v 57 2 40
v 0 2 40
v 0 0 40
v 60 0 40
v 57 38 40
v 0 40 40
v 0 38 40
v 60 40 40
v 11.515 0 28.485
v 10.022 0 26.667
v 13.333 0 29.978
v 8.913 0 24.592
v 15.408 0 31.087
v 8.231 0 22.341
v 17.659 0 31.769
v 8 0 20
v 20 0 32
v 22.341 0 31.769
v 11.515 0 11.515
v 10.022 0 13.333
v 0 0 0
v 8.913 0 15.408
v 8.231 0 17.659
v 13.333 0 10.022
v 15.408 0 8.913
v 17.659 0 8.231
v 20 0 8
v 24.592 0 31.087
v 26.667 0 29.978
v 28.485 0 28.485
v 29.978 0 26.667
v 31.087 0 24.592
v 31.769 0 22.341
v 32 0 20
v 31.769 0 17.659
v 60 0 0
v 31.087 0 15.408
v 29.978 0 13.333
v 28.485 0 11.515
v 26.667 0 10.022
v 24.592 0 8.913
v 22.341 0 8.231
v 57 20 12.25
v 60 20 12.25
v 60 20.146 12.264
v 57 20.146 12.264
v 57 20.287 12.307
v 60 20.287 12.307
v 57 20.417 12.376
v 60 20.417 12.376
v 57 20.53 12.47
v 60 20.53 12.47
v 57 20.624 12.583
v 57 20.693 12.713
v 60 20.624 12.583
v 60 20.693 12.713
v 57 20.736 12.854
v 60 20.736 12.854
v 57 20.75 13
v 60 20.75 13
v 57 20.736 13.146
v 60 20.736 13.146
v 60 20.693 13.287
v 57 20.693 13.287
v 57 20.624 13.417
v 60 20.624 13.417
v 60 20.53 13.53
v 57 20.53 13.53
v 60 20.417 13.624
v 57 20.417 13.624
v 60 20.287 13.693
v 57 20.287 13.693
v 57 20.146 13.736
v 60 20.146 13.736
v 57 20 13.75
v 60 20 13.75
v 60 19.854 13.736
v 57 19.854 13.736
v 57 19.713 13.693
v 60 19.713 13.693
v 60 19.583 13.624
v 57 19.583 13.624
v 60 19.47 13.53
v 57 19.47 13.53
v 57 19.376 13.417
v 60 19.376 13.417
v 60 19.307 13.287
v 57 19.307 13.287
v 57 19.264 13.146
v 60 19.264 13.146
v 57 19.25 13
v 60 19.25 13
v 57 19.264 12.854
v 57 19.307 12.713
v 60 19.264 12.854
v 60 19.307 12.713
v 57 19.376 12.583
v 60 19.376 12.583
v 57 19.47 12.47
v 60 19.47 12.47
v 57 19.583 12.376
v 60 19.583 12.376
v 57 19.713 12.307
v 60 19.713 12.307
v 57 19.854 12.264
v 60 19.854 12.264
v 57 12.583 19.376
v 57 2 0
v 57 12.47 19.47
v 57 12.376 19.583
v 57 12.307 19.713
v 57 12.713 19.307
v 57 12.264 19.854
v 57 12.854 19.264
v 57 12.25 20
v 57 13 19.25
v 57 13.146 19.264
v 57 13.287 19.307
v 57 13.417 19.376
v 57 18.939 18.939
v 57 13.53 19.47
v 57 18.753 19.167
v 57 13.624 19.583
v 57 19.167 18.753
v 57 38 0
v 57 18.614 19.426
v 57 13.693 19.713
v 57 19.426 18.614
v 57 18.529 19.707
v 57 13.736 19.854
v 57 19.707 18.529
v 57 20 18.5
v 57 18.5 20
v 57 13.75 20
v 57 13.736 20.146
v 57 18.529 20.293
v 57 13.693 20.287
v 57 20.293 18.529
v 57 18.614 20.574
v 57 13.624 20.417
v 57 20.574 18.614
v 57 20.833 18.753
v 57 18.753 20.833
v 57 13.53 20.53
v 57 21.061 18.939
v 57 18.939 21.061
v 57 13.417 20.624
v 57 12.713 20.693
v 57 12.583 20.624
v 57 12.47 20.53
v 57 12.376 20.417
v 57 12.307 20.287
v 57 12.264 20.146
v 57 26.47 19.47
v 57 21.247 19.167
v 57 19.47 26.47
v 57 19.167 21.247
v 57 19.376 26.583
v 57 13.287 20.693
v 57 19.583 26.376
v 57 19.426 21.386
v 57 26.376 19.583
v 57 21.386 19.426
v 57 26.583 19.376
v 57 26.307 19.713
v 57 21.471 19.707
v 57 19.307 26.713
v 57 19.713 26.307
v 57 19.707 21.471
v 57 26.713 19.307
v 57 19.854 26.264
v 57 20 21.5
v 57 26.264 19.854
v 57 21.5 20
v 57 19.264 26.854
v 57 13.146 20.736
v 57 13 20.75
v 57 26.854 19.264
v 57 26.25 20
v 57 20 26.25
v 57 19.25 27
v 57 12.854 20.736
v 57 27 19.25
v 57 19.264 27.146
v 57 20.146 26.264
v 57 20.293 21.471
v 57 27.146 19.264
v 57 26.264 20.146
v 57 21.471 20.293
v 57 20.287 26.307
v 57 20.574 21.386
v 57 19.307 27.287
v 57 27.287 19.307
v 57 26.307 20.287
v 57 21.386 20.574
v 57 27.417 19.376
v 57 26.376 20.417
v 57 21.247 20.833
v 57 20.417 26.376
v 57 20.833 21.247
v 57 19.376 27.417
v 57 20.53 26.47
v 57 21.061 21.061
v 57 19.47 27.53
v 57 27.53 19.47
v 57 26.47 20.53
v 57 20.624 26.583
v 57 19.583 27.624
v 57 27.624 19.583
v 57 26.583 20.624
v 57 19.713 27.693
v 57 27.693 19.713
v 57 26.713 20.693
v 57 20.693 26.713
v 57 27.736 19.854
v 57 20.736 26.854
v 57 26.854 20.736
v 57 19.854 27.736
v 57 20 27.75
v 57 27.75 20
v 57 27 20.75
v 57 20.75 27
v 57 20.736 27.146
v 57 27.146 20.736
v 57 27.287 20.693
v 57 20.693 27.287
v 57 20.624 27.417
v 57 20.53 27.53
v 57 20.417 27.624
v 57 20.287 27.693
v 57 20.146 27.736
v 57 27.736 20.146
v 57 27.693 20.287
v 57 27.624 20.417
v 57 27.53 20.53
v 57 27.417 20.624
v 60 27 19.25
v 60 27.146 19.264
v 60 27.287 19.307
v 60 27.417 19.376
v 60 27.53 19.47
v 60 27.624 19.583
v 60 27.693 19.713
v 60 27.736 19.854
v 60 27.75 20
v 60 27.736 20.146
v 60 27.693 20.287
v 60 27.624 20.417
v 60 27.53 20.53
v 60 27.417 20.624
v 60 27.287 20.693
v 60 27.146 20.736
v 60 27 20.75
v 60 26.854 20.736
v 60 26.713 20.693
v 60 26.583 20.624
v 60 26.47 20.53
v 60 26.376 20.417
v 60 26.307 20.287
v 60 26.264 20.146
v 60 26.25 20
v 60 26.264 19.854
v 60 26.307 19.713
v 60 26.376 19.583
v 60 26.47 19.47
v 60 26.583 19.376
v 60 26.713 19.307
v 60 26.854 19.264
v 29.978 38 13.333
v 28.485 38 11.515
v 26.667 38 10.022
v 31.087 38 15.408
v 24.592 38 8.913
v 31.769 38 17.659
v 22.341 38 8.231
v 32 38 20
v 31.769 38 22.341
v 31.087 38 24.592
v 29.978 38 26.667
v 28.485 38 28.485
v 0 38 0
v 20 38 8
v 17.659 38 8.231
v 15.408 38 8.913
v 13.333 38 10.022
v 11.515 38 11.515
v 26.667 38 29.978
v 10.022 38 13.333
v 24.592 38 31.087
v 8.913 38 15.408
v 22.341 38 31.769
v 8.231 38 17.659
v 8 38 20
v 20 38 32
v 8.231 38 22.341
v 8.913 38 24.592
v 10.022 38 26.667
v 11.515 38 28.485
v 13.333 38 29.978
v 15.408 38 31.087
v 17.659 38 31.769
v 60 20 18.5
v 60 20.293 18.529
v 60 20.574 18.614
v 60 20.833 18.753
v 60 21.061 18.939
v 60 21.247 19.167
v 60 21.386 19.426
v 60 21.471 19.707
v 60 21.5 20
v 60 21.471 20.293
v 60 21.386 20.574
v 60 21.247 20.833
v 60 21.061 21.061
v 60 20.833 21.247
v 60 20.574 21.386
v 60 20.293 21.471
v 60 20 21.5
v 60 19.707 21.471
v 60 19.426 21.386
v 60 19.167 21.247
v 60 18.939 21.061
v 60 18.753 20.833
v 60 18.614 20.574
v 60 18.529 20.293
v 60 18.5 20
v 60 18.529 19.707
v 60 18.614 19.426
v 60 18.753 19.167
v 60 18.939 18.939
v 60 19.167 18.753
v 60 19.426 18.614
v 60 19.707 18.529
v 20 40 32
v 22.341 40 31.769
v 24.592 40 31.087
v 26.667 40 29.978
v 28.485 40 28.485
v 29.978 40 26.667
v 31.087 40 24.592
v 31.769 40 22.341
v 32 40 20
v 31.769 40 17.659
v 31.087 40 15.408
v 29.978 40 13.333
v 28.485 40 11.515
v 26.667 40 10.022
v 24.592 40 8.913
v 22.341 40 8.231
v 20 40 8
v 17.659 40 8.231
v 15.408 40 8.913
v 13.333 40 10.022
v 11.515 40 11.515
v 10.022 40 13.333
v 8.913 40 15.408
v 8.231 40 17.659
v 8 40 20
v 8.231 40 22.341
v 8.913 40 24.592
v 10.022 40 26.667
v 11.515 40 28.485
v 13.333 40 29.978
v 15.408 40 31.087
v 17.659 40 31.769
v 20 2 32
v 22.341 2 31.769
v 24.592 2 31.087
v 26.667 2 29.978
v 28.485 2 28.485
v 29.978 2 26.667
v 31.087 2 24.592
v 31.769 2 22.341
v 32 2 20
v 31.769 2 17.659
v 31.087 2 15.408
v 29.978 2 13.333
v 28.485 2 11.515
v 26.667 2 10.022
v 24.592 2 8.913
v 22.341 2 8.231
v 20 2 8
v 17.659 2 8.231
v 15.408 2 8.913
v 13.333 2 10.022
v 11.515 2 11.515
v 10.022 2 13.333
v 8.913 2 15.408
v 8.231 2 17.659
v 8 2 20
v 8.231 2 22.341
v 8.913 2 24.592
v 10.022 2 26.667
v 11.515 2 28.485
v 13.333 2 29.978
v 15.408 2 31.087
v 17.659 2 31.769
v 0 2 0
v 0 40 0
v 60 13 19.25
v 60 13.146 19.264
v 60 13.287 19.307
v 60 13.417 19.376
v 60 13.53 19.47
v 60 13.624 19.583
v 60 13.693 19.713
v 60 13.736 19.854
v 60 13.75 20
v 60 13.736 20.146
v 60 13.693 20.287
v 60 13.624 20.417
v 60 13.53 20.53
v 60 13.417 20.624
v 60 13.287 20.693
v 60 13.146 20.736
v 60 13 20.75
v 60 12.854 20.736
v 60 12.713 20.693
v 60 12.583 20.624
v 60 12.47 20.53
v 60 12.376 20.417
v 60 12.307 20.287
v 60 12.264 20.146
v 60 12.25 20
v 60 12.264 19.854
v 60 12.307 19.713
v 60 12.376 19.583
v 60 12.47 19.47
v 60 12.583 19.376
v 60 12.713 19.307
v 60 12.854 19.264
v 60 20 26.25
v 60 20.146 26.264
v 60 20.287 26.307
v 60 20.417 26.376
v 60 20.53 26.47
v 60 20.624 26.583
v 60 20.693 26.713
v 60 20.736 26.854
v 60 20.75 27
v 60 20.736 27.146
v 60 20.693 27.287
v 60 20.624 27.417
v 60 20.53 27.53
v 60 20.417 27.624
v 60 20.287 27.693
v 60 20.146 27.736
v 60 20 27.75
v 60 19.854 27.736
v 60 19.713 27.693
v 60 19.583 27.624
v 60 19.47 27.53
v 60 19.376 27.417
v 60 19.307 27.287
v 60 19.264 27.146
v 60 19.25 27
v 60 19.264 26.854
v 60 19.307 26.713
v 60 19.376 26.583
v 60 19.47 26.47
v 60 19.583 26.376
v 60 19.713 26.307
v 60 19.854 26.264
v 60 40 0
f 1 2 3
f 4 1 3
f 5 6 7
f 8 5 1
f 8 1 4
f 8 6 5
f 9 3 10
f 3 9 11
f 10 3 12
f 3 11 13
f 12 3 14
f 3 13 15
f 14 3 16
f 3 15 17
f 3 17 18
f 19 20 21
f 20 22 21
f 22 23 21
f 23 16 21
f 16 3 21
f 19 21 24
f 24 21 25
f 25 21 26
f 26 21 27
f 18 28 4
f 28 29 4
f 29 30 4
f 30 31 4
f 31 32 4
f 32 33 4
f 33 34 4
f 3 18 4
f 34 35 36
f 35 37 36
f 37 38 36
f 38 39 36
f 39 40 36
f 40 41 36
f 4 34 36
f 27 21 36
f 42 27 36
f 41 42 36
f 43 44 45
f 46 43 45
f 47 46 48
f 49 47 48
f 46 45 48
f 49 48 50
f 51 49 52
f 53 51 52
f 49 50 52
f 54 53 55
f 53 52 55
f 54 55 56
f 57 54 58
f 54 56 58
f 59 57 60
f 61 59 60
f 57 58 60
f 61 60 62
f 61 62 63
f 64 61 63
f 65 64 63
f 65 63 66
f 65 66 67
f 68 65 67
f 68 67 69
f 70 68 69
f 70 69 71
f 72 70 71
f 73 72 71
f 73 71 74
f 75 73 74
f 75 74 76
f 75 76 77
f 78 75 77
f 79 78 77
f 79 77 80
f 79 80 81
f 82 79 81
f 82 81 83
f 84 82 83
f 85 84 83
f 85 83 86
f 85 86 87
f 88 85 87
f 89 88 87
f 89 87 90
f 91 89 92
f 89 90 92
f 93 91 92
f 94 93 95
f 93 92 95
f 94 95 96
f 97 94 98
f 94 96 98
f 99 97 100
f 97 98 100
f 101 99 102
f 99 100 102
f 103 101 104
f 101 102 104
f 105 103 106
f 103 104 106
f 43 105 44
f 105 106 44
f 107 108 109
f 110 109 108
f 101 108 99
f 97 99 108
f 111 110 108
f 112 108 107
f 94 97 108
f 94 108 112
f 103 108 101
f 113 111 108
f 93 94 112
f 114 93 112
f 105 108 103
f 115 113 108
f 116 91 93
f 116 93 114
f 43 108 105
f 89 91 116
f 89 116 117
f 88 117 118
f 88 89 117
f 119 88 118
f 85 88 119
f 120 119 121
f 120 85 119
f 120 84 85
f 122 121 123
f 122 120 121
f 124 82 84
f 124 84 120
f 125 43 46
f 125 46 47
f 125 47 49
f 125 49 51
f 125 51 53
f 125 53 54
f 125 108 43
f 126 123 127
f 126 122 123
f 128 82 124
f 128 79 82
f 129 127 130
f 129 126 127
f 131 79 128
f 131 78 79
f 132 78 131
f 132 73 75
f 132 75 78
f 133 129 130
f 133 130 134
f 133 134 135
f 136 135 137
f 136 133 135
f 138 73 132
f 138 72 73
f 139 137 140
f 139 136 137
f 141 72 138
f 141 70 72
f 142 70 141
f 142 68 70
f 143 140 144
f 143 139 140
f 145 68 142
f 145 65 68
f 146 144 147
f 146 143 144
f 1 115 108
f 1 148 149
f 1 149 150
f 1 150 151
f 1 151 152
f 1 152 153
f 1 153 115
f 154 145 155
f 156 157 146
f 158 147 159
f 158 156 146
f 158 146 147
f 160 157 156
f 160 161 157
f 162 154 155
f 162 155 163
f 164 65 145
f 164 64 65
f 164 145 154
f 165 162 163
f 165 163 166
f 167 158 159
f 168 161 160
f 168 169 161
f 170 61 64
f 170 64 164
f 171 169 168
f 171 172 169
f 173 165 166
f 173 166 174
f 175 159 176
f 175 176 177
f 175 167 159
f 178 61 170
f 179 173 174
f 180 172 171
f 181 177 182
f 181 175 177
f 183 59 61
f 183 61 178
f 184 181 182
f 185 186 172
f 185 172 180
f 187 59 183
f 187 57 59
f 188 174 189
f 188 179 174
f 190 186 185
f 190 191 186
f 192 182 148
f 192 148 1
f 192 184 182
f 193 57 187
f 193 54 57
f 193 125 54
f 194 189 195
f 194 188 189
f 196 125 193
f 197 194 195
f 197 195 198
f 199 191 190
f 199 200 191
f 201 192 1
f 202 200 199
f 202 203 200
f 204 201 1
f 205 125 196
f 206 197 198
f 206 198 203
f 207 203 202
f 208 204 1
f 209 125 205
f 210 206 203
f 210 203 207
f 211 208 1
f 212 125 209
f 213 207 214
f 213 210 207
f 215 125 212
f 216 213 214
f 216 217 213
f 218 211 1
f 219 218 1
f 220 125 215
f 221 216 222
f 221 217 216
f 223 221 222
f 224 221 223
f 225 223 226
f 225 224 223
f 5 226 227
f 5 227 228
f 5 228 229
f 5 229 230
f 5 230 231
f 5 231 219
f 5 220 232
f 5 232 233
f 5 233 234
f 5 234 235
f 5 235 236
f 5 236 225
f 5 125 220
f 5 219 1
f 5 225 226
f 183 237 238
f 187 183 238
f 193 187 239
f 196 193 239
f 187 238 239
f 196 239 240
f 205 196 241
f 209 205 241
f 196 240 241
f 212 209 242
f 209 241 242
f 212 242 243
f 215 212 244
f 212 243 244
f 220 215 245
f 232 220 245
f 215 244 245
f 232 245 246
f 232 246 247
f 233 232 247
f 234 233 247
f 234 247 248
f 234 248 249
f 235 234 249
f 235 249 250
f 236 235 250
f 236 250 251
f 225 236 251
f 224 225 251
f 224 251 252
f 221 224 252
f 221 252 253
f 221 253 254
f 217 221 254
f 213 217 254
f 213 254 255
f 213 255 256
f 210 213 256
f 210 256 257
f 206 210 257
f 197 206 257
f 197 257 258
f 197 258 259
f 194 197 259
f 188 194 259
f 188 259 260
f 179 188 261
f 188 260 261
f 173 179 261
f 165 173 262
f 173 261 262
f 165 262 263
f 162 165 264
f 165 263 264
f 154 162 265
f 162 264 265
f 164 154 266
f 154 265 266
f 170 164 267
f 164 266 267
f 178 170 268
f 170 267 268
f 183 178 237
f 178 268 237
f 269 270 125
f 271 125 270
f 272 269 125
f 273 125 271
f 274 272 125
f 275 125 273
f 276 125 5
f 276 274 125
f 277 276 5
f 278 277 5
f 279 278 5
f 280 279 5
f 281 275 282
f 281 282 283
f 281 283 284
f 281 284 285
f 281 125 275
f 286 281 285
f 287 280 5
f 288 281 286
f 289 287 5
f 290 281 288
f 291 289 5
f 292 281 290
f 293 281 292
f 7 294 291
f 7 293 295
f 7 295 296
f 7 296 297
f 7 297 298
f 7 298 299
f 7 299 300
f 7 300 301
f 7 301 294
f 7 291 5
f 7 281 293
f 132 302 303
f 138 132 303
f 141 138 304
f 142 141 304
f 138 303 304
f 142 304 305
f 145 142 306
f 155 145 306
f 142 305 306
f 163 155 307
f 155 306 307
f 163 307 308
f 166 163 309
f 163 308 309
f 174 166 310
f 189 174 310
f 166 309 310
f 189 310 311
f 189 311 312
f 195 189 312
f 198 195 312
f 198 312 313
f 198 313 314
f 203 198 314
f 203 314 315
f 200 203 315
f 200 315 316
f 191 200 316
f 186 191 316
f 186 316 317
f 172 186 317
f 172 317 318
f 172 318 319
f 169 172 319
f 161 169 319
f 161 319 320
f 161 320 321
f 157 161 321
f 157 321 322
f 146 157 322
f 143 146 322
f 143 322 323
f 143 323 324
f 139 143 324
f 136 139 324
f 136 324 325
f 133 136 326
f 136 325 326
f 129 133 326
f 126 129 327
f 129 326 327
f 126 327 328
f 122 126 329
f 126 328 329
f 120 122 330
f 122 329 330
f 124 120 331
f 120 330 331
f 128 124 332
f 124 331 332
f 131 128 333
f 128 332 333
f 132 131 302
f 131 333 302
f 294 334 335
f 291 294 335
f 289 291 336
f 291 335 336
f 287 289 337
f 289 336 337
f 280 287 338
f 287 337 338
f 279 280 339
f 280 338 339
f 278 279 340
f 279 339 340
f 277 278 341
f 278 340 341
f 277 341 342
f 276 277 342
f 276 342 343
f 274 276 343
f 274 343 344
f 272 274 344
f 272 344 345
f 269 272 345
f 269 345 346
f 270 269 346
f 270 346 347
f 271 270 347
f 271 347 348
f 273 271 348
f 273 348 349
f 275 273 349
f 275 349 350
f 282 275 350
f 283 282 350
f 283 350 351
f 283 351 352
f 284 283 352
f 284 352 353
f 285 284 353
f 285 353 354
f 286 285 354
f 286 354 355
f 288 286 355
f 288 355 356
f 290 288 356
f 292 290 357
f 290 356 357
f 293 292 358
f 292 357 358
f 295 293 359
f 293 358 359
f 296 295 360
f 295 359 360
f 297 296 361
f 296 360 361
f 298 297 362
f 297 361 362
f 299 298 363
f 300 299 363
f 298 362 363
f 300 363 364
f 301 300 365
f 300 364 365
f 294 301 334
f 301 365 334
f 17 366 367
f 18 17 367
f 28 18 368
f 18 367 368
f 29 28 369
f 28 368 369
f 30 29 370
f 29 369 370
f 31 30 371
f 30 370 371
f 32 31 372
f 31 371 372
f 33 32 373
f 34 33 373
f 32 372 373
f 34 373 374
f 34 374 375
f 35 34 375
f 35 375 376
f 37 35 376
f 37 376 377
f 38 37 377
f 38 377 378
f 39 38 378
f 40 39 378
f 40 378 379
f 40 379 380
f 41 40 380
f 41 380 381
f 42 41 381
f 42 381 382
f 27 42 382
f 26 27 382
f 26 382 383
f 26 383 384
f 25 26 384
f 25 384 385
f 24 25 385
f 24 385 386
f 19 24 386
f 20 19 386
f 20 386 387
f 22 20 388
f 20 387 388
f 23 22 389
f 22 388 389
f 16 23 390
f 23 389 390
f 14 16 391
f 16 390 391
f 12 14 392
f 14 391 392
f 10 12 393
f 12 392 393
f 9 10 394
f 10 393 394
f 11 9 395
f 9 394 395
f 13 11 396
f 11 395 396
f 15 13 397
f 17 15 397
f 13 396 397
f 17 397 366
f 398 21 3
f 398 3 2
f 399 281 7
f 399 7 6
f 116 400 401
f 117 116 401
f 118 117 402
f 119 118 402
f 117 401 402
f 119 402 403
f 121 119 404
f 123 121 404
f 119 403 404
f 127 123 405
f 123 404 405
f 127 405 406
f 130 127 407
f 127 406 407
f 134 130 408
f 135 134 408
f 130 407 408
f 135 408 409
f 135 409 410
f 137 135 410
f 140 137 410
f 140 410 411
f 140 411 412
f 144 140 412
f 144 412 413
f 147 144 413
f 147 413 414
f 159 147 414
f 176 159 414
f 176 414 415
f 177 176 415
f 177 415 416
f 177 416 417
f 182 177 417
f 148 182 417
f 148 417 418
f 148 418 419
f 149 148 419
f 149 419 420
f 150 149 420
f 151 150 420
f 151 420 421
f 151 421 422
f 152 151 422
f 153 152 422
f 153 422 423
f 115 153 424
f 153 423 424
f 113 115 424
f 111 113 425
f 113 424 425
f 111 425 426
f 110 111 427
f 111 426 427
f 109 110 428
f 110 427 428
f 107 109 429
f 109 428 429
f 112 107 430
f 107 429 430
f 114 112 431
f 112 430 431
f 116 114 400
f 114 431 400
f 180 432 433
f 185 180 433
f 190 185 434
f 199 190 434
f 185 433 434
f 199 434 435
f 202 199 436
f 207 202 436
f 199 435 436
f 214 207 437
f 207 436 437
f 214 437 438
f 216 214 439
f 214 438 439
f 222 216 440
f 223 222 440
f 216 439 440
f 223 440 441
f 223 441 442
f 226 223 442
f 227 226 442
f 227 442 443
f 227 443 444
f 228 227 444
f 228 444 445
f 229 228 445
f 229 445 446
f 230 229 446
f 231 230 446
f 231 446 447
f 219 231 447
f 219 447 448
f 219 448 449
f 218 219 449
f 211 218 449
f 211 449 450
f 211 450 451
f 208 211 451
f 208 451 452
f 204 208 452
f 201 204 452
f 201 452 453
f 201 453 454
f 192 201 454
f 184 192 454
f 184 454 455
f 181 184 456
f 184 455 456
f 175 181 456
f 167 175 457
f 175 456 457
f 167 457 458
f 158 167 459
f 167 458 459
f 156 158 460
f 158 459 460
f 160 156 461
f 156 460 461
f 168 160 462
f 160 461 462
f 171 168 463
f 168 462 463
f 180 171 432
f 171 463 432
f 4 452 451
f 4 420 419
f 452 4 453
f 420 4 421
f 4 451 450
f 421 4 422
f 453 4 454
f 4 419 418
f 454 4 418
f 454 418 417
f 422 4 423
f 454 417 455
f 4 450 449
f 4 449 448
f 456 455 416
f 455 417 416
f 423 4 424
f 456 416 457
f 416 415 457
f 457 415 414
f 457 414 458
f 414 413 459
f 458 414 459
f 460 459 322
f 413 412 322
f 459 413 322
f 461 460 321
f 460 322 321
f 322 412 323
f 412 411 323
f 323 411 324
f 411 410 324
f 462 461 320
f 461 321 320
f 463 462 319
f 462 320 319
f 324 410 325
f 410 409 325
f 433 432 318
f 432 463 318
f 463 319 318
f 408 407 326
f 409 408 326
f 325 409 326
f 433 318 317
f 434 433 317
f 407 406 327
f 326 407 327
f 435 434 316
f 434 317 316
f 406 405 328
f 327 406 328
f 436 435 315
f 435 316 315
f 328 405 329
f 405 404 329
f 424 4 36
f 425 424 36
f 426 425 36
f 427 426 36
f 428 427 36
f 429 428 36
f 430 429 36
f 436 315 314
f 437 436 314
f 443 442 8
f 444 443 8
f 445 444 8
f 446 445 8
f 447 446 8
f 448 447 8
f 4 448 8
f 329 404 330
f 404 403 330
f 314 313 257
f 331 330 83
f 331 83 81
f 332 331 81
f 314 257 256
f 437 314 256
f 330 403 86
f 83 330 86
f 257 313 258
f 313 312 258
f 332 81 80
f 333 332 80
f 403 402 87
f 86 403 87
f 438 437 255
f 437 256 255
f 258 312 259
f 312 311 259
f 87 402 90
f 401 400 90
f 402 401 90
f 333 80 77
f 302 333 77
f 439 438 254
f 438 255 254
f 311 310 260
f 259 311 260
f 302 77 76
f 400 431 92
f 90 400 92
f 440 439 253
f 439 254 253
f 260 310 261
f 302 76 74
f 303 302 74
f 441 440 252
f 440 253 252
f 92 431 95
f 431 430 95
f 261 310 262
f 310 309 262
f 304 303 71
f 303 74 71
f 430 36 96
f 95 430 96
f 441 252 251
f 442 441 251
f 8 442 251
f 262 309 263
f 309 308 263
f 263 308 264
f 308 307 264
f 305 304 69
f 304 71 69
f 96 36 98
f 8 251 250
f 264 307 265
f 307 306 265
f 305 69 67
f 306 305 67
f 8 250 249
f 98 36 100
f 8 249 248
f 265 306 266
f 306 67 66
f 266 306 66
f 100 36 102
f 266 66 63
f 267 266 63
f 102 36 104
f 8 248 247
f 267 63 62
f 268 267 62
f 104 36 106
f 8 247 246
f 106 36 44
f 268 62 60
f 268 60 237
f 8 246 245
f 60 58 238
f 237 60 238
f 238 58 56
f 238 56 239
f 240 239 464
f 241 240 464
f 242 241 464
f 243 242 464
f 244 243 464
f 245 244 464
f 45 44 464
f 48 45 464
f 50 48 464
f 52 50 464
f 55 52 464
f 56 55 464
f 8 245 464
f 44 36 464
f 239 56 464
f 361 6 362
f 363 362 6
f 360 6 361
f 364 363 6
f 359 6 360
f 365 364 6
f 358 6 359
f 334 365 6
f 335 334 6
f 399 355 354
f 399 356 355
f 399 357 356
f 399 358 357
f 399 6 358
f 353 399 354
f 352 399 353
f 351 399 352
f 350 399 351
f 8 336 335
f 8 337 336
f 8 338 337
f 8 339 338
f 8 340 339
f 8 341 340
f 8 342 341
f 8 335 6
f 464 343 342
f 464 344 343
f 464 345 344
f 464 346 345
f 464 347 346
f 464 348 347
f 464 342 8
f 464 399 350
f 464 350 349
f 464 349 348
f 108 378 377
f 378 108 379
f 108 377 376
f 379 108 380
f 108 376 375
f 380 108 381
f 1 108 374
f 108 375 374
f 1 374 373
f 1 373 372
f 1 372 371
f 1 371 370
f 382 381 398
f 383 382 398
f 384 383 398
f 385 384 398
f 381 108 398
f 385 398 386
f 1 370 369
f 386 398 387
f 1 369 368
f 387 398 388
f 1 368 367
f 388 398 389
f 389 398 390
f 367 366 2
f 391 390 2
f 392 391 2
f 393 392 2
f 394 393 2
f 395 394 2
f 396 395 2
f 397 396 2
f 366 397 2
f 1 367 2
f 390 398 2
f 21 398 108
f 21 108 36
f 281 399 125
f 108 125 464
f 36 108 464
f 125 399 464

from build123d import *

# Parameters (mm, degrees)
SKETCH_1_W          = 60
SKETCH_1_H          = 40
EXTRUDE_1_DEPTH     = 40
SKETCH_2_W          = 40
SKETCH_2_H          = 36
CUT_EXTRUDE_1_DEPTH = 57
CUT_EXTRUDE_2_REACH = 84.462
SKETCH_3_R          = 1.5
SKETCH_4_R          = 0.75
CUT_EXTRUDE_3_DEPTH = 38
SKETCH_5_R          = 12
CUT_EXTRUDE_4_DEPTH = 83.462112512


with BuildPart() as part:
    # 草图1 → 凸台-拉伸1 (new body)
    with BuildSketch(Plane.XY):
        with Locations((30, 20)):
            Rectangle(SKETCH_1_W, SKETCH_1_H)
    extrude(amount=EXTRUDE_1_DEPTH)

    # 草图2 → 切除-拉伸1 (cut)
    with BuildSketch(Plane.ZY):
        with Locations((20, 20)):
            Rectangle(SKETCH_2_W, SKETCH_2_H)
    extrude(amount=-CUT_EXTRUDE_1_DEPTH, mode=Mode.SUBTRACT)

    # 草图3 → 切除-拉伸2 (cut, up to next)
    with BuildSketch(Plane(origin=(60, 0, 0), x_dir=(0, 0, -1), z_dir=(1, 0, 0)), mode=Mode.PRIVATE) as cut_extrude_2_sk1:
        with Locations((-20, 20)):
            Circle(SKETCH_3_R)
    cut_extrude_2_tool1 = extrude(cut_extrude_2_sk1.sketch, amount=-CUT_EXTRUDE_2_REACH, mode=Mode.PRIVATE) & part.part
    add(cut_extrude_2_tool1.solids().sort_by_distance((60, 20, 20))[0], mode=Mode.SUBTRACT)

    # 草图4 → 切除-拉伸3 (cut)
    with BuildSketch(Plane(origin=(60, 0, 0), x_dir=(0, 0, -1), z_dir=(1, 0, 0))):
        with Locations((-20, 27)):
            Circle(SKETCH_4_R)
        with Locations((-13, 20)):
            Circle(SKETCH_4_R)
        with Locations((-20, 13)):
            Circle(SKETCH_4_R)
        with Locations((-27, 20)):
            Circle(SKETCH_4_R)
    extrude(amount=-CUT_EXTRUDE_3_DEPTH, mode=Mode.SUBTRACT)

    # 草图5 → 切除-拉伸4 (cut, through all)
    with BuildSketch(Plane(origin=(0, 40, 0), x_dir=(1, 0, 0), z_dir=(0, 1, 0))):
        with Locations(Location((20, -20, 0), (0, 0, 270))):
            Circle(SKETCH_5_R)
    extrude(amount=-CUT_EXTRUDE_4_DEPTH, mode=Mode.SUBTRACT)


solid = part.part
